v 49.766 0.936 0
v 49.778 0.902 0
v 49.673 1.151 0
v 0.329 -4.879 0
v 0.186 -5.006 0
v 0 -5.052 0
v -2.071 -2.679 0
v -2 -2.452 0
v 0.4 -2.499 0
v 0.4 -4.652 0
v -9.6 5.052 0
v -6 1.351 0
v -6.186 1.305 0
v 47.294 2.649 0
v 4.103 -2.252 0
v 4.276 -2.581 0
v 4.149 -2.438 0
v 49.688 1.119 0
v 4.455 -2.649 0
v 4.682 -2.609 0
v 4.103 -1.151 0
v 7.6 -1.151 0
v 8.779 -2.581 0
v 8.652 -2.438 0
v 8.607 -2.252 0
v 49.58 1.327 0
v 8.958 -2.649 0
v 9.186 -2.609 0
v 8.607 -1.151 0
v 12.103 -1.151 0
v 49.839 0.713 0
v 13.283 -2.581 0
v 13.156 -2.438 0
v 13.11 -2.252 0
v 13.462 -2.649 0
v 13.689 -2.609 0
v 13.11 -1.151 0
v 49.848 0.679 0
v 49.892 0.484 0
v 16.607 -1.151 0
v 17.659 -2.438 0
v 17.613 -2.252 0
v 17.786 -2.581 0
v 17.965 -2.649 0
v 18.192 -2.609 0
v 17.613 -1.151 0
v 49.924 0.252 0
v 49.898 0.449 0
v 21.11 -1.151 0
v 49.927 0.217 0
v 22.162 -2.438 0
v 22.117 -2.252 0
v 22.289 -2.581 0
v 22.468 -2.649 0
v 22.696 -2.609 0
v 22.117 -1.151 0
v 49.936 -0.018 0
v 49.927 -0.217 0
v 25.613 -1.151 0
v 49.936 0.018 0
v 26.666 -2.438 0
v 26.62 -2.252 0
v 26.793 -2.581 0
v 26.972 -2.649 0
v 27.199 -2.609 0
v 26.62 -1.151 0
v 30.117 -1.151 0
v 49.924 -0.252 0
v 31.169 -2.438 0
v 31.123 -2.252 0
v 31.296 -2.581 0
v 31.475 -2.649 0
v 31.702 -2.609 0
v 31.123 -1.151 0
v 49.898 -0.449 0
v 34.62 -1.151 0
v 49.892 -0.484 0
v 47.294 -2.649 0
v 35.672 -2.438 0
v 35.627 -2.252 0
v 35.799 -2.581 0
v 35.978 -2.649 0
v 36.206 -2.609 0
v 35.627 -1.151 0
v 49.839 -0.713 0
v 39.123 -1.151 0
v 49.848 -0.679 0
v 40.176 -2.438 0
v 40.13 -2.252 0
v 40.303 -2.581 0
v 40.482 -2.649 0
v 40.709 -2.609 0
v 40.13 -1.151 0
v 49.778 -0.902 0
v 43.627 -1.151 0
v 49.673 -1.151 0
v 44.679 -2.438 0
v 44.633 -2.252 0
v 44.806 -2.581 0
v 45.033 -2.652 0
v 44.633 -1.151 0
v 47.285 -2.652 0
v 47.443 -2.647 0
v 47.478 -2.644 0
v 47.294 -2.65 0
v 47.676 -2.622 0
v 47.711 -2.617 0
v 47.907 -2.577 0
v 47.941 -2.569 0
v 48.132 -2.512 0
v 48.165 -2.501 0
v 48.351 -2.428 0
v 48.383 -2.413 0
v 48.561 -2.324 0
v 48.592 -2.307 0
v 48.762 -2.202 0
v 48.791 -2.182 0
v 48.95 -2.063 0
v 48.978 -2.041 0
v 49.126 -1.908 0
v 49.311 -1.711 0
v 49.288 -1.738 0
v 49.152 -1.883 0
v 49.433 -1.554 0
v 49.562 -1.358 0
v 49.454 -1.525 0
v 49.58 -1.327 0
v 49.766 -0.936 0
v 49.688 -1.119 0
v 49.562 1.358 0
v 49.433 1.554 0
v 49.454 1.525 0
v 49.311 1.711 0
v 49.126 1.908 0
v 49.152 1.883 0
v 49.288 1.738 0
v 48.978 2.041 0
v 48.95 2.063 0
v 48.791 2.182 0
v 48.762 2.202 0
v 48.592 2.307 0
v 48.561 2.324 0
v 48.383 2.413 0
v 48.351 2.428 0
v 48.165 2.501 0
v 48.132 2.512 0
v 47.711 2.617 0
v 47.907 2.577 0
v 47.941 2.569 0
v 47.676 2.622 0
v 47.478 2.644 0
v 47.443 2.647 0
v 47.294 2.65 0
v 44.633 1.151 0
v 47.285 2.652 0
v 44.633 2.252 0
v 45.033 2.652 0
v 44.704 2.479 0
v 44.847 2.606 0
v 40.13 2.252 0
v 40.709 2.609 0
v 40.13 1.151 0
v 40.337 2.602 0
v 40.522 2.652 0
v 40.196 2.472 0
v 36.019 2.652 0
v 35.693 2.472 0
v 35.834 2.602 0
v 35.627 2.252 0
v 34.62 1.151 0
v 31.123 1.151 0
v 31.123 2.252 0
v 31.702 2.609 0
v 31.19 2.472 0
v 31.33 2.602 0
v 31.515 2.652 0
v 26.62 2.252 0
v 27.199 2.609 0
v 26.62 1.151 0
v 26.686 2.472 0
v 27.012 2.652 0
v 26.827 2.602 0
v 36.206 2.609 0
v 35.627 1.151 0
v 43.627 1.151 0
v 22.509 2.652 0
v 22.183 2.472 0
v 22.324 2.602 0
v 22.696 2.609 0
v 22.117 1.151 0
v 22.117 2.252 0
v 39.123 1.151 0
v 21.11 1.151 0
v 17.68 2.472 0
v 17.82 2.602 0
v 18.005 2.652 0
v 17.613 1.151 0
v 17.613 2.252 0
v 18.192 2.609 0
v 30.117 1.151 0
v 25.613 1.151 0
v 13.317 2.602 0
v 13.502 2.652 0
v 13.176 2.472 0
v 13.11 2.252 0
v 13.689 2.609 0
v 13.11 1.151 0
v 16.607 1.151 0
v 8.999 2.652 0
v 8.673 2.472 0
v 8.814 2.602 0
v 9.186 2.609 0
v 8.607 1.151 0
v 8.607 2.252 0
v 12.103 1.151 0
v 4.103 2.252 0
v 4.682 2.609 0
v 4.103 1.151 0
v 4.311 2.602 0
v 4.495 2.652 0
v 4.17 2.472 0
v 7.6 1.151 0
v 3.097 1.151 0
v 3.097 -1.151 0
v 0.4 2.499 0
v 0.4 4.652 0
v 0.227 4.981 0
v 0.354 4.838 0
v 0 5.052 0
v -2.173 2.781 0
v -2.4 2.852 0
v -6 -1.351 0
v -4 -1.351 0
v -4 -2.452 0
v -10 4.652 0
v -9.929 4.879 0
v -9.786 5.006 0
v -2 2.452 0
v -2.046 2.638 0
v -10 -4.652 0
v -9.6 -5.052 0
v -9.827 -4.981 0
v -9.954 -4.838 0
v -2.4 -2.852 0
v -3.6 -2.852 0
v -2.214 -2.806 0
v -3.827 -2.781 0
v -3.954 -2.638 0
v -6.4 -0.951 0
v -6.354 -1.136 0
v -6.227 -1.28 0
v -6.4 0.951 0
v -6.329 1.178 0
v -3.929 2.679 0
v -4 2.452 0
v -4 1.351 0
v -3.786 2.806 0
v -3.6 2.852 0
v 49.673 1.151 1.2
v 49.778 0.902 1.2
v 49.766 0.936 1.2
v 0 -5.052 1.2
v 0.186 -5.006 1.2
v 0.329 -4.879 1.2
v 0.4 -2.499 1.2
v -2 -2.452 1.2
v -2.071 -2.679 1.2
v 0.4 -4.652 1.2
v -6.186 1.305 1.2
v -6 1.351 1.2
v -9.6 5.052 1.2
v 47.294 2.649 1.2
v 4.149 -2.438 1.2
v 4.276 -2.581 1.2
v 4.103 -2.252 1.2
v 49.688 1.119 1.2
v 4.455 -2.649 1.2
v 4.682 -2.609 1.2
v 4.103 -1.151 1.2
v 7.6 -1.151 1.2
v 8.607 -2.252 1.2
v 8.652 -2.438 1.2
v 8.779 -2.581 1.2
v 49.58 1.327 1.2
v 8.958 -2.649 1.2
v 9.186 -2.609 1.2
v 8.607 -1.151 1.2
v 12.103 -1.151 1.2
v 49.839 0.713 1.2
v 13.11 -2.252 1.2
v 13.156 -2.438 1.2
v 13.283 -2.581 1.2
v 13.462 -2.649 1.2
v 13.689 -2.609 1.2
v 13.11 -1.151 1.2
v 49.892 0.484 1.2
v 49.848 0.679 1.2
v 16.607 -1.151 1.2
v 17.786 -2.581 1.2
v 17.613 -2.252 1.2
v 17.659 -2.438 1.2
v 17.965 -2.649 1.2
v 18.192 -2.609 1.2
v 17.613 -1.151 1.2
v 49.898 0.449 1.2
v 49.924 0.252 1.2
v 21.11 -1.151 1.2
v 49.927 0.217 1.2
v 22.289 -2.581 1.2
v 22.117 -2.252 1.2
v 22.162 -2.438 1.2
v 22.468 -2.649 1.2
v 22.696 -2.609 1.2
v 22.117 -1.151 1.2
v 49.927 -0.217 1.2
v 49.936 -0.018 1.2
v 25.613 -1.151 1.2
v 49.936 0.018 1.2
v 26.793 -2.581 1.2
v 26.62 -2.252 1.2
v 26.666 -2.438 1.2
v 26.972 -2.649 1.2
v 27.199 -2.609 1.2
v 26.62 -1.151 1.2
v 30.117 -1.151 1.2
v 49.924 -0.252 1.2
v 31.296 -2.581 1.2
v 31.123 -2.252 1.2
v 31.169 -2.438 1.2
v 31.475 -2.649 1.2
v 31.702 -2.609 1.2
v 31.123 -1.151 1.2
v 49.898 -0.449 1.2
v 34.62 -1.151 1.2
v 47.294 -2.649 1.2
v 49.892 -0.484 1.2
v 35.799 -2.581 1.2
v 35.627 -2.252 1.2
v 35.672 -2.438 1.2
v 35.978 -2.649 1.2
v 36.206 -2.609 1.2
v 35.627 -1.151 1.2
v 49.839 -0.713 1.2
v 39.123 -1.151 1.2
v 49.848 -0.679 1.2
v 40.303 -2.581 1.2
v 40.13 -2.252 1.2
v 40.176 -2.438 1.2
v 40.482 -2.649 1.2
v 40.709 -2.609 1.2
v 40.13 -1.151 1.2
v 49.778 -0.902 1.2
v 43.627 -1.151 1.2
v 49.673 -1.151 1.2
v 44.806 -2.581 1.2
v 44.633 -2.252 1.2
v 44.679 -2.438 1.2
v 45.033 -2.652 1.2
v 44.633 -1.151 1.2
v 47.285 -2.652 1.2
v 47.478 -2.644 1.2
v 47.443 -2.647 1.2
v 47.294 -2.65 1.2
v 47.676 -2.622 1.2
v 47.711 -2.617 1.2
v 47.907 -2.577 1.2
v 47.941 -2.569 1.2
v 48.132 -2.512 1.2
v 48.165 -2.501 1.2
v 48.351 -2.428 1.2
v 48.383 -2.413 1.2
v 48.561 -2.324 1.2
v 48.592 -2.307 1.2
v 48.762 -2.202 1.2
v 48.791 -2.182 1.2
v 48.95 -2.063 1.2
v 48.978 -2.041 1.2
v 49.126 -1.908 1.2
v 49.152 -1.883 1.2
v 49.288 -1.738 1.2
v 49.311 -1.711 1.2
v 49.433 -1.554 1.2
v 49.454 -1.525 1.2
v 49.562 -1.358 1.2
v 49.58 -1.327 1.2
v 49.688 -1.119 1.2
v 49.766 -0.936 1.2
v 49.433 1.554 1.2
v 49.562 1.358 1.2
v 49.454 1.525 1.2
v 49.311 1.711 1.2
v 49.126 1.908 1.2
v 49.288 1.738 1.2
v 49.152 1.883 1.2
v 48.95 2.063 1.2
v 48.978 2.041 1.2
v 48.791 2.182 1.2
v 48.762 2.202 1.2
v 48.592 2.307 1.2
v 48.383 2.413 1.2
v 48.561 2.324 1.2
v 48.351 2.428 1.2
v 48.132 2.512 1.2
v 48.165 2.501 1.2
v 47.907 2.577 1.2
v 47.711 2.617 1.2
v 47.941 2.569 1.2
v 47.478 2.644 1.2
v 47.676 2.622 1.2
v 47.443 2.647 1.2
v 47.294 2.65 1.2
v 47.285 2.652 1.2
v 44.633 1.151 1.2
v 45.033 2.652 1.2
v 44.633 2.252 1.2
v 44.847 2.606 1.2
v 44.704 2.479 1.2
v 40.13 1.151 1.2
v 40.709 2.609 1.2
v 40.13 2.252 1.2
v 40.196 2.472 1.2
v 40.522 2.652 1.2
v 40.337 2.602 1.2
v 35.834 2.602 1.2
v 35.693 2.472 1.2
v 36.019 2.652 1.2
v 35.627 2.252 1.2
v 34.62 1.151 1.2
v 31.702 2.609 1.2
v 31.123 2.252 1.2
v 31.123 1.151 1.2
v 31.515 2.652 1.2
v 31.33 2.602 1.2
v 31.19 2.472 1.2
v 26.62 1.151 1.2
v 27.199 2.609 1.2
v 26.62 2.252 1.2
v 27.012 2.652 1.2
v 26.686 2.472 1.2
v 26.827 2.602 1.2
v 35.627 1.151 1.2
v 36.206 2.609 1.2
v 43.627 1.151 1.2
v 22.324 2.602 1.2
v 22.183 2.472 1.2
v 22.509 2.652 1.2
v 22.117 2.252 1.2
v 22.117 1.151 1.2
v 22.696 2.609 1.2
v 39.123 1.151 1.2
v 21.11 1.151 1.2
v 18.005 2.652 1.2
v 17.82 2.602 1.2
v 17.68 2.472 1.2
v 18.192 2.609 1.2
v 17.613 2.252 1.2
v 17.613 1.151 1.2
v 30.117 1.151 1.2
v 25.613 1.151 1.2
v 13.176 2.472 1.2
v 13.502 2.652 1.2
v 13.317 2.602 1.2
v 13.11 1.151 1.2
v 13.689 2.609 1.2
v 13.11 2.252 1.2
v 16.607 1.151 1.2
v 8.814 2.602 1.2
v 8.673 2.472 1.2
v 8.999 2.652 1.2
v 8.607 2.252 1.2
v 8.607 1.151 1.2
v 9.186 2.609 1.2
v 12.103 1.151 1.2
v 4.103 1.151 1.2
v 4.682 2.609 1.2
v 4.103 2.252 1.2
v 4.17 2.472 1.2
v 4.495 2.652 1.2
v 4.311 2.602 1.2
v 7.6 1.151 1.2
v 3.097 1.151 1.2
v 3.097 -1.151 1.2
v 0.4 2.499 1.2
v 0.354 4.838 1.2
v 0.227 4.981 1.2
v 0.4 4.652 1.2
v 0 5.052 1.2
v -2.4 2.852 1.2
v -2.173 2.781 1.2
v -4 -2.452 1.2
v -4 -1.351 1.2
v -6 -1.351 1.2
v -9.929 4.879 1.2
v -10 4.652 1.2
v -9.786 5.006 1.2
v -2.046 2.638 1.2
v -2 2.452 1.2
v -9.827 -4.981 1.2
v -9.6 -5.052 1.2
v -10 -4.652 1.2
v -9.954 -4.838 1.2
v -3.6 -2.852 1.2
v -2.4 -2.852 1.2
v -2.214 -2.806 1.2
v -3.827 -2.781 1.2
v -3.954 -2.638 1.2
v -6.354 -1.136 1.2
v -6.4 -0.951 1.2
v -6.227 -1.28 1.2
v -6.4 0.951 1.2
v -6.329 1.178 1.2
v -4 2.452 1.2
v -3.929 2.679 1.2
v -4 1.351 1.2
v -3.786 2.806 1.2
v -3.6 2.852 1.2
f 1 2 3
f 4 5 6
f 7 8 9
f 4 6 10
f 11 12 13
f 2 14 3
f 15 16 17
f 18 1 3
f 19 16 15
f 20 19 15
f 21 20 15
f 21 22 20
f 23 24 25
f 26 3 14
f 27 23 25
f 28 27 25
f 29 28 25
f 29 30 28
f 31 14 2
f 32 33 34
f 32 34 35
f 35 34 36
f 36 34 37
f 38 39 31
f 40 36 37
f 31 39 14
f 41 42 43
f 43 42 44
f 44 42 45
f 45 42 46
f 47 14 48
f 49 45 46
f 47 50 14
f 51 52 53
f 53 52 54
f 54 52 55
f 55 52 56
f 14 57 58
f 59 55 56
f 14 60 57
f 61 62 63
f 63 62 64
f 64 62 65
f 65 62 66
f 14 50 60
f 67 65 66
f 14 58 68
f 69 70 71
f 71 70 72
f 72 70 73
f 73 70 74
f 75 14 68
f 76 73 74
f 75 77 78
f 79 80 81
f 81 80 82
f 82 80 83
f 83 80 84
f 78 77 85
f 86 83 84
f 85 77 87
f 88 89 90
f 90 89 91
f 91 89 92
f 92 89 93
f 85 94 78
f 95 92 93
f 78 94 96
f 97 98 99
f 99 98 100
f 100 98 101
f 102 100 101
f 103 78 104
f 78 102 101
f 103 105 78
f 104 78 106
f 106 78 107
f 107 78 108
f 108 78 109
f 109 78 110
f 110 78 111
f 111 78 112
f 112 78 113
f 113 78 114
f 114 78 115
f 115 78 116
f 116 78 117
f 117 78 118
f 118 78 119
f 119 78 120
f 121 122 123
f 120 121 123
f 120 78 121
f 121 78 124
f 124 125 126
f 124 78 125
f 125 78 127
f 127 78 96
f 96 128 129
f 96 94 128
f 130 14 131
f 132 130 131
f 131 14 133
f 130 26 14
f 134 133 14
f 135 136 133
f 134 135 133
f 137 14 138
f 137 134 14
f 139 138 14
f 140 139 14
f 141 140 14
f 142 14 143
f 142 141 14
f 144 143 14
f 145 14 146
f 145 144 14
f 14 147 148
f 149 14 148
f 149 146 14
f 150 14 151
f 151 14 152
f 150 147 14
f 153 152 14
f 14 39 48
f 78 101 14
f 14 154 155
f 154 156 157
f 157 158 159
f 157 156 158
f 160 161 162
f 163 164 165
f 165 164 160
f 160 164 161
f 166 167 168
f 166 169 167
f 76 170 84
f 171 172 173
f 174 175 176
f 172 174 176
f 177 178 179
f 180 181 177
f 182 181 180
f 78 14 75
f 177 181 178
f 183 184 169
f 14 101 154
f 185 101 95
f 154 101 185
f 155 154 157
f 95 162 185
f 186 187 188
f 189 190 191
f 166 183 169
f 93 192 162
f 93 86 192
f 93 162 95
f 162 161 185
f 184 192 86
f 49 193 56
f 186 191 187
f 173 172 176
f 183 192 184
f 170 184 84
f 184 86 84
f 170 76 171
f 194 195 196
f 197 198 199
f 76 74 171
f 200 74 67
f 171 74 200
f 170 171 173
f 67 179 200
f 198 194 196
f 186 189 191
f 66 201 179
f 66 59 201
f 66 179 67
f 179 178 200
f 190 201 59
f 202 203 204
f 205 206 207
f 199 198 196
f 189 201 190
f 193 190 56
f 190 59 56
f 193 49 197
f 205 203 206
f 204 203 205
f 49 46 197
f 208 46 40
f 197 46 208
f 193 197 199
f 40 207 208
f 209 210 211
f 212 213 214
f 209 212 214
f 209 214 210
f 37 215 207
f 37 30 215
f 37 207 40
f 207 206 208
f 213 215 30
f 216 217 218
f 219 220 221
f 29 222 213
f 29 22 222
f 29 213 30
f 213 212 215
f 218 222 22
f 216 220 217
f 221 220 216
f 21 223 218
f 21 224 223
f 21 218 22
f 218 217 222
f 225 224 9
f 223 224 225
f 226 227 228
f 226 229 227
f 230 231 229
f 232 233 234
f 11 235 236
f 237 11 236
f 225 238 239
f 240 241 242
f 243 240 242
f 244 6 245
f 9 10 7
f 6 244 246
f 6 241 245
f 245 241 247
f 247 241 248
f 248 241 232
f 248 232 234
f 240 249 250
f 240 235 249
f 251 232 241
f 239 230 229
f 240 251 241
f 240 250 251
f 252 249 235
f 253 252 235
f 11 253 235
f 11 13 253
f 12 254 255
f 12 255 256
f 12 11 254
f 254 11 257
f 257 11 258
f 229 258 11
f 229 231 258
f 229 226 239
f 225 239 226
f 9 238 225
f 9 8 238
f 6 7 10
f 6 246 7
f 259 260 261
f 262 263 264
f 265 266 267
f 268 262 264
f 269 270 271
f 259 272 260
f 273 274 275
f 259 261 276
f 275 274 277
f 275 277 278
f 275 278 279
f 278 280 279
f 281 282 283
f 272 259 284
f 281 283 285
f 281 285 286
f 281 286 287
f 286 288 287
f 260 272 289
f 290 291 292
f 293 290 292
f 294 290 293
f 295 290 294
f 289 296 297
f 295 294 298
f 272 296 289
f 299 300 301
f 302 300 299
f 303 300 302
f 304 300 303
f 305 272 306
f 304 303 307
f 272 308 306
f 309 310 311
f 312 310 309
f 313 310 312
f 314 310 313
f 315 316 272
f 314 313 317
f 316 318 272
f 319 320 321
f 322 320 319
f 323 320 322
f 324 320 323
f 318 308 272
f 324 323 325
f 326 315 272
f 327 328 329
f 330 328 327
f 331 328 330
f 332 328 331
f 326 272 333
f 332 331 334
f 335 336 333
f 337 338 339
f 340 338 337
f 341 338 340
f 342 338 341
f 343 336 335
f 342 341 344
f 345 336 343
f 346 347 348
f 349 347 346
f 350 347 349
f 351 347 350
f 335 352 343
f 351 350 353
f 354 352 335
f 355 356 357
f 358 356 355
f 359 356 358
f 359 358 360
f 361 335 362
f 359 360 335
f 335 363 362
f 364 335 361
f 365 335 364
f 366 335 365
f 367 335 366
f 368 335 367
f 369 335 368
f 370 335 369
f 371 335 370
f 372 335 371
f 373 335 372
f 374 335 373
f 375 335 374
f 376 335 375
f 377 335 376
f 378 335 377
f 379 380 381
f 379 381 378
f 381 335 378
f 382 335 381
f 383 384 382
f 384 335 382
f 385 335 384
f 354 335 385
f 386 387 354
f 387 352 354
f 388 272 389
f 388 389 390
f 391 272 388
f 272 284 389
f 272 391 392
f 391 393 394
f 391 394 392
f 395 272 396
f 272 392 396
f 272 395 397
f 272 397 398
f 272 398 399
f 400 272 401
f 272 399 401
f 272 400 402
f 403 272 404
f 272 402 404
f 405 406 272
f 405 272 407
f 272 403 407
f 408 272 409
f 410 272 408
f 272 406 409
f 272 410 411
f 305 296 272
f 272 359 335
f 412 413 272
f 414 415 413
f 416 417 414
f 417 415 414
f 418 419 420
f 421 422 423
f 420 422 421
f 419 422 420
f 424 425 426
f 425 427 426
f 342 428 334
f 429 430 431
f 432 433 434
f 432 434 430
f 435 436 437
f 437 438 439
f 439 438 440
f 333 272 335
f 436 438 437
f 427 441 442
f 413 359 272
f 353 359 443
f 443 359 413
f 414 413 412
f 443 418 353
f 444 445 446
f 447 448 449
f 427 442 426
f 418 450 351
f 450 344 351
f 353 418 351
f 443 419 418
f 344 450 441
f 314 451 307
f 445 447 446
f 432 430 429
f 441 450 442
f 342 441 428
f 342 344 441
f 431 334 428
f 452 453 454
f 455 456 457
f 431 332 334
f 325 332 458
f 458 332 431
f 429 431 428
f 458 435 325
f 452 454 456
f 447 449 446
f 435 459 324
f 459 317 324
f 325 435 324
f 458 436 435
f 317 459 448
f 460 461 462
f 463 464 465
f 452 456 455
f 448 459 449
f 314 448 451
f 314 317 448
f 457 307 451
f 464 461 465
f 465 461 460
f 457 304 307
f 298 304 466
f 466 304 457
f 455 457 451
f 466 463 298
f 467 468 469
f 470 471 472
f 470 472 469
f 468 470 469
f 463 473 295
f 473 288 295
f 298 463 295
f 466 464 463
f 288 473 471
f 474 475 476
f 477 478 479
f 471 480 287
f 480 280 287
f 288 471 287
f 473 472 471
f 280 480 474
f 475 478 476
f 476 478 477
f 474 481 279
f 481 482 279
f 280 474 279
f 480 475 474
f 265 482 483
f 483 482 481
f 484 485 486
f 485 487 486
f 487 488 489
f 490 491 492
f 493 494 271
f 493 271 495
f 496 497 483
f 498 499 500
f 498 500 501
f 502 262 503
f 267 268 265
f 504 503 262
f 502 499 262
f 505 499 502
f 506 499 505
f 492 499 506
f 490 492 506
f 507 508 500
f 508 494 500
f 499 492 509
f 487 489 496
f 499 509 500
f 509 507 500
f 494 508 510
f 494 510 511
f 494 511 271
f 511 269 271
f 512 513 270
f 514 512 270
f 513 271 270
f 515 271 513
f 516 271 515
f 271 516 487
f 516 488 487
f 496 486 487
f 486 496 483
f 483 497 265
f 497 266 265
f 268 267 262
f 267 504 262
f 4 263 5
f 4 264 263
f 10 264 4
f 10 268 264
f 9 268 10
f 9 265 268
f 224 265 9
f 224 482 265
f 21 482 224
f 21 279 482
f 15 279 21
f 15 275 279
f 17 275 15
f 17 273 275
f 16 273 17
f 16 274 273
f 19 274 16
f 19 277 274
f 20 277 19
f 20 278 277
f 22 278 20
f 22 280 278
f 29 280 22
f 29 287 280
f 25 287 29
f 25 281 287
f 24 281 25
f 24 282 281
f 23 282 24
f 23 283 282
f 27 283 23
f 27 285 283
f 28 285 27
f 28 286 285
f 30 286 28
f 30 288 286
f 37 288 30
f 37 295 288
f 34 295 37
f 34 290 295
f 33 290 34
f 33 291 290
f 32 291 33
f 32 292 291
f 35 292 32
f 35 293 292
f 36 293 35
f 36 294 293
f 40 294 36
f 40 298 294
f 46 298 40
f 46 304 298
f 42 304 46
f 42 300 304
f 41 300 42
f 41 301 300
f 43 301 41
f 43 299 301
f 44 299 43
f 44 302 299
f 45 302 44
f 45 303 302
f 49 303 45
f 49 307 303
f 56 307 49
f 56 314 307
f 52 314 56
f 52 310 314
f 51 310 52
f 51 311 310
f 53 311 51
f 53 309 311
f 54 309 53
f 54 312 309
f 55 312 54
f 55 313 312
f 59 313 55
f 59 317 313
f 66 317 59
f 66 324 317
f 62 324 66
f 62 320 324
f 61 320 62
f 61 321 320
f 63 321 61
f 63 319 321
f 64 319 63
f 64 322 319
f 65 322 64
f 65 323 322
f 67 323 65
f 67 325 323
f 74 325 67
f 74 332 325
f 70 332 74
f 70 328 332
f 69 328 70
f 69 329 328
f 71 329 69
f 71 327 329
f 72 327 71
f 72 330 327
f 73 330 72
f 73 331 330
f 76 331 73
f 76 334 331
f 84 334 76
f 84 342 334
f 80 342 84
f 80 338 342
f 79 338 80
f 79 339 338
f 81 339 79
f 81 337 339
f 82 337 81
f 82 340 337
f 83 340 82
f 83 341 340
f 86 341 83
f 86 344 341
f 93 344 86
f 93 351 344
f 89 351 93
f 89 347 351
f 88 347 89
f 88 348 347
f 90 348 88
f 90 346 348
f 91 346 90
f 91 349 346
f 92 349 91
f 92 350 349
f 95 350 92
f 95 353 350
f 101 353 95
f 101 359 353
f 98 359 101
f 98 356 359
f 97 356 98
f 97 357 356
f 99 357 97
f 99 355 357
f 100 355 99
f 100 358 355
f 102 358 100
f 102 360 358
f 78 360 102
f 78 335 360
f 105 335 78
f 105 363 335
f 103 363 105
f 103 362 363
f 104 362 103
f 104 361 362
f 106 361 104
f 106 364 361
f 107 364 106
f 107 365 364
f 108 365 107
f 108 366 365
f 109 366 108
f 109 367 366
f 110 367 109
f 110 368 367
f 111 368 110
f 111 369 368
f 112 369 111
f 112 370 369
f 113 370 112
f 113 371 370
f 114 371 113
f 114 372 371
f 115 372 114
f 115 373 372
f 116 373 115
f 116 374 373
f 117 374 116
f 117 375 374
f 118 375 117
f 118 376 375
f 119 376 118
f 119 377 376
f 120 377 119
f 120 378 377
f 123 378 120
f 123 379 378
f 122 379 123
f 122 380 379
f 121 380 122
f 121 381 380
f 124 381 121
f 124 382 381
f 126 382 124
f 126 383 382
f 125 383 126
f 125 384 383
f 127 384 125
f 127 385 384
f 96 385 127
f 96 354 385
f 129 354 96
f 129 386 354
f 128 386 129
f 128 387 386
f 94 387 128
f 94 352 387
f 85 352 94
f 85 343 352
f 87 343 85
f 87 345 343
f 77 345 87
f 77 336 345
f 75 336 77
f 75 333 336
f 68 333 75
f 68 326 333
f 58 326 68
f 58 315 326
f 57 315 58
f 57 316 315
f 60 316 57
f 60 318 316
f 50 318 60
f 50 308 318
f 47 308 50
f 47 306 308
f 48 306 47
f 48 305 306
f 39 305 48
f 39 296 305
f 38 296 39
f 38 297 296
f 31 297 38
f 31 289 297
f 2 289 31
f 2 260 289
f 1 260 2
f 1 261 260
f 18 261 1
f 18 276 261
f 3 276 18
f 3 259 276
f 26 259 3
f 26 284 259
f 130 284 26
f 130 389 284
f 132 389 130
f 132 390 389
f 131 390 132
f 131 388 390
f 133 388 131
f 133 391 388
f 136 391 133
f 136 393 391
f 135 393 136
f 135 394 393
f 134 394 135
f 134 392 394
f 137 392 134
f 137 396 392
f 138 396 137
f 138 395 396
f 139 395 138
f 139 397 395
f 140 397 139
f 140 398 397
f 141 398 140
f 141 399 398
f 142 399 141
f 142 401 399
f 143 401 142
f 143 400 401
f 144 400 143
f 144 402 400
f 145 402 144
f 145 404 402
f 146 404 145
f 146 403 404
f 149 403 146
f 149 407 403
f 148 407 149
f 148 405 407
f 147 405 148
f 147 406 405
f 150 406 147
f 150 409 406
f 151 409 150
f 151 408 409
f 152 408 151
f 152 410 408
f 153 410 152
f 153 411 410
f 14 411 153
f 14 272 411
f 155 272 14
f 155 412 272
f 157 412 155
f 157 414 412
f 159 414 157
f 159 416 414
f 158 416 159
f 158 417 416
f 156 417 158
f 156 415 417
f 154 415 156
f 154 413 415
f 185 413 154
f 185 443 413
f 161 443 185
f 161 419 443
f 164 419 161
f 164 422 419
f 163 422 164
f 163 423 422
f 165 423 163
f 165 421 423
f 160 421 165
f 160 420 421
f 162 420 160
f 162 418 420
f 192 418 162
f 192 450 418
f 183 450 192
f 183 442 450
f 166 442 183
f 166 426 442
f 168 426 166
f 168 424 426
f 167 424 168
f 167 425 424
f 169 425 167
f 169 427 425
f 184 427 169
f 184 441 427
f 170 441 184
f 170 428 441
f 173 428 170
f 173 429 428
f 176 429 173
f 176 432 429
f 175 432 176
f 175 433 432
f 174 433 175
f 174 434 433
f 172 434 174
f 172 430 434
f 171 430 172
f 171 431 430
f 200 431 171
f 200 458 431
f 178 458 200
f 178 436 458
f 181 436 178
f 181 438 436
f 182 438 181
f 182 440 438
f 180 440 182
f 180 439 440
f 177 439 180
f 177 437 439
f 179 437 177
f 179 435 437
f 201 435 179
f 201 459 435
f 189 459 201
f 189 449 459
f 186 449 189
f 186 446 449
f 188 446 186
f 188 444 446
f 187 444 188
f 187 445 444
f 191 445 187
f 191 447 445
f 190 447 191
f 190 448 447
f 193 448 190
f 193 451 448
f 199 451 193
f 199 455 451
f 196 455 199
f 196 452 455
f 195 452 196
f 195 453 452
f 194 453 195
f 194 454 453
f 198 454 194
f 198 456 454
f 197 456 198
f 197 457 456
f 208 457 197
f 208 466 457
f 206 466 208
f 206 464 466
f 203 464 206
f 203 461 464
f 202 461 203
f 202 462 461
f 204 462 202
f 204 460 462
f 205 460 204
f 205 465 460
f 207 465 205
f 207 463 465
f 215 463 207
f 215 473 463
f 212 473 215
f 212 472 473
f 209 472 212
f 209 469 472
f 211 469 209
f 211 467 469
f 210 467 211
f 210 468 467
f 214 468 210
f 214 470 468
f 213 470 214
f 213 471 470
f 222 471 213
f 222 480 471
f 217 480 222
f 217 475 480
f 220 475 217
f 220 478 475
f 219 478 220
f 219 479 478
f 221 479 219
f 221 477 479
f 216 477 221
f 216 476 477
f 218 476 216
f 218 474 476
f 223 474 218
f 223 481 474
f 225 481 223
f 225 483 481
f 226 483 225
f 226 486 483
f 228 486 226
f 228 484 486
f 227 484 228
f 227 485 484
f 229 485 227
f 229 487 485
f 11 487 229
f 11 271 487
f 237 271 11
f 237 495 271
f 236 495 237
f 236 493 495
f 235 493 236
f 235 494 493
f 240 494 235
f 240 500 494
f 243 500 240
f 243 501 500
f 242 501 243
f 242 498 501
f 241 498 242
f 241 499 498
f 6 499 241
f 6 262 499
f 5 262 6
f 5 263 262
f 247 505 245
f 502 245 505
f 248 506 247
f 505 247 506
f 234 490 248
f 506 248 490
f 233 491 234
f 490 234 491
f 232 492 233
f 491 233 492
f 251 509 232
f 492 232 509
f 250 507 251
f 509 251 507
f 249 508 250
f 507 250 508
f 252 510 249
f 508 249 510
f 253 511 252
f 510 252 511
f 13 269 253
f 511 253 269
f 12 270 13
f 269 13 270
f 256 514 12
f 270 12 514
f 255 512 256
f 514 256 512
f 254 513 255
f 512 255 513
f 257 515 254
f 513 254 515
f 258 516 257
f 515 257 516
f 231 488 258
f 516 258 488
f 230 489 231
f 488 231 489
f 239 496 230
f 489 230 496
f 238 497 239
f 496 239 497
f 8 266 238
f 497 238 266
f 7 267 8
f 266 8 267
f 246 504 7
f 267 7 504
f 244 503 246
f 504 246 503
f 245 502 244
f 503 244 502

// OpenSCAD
/*
 * cabletie.scad generates cable ties meant to be 3D printed in TPU
 */

// Variables default values
cabletie_width = 6;
cabletie_wrapping_diameter = 15;
cabletie_minimum_thickness = 1.2; // would be override if to large

// FDM 3D printer parameters
nozzle_width = 0.4;
printer_tolerance = 0.2;

// funcions
function cabletie_wrapping_circumference(d=cabletie_wrapping_diameter) = 3.14*d;
function cabletie_steps_lenth(w=cabletie_width, nw=nozzle_width) = (w-2*nw)*cos(30);
function cabletie_links_count(d=cabletie_wrapping_diameter, w=cabletie_width, nw=nozzle_width) = floor(cabletie_wrapping_circumference(d)/cabletie_steps_lenth(w, nw));
function retainer_hole_length(w=cabletie_width, nw=nozzle_width) = cabletie_steps_lenth(w, nw)/3;
function release_hole_length(w=cabletie_width, nw=nozzle_width) = cabletie_steps_lenth(w, nw);
function cabletie_maximum_thickness(w=cabletie_wrapping_diameter, nw=nozzle_width) = (cabletie_steps_lenth(w, nw)/3+nw)/tan(30)-(nw/sin(30)-nw);
function cabletie_thickness(mini_thickness, maxi_thickness) = mini_thickness > maxi_thickness ? maxi_thickness : mini_thickness;

// Resolution
$fa=2; // default minimum facet angle
$fs=0.2; // default minimum facet size

module cabletie(w=cabletie_width,
                d=cabletie_wrapping_diameter,
                t=cabletie_minimum_thickness,
                nw=nozzle_width,
                pt=printer_tolerance) {
     translate([0, 0, cabletie_thickness(t, cabletie_maximum_thickness(w, nw))/2])
     linear_extrude(height = cabletie_thickness(t, cabletie_maximum_thickness(w, nw)),
                    center = true, convexity = 10, twist = 0) {
          difference() {
               //offset(r = 0) {
               offset(r = nozzle_width) { // smooth hard edges
                    union() {
                         // links
                         for (i = [0 : cabletie_steps_lenth(w, nw) : cabletie_steps_lenth(w, nw)*(cabletie_links_count(d, w, nw)-1)]) {
                    	         translate([i, 0, 0]) {
                                 
                                   polygon(points=[// shape of a regular link
                                                   [0,0],
                                                   [0,cabletie_steps_lenth(w, nw)/2],
                                                   [cabletie_steps_lenth(w, nw),0],
                                                   [0,-cabletie_steps_lenth(w, nw)/2]
                                                  ]);
                             }
                    	   }
                         // last link custom shape
                         translate([cabletie_steps_lenth(w, nw)*(cabletie_links_count(d, w, nw)+0.5), 0, 0]) {
                              circle(d = cabletie_steps_lenth(w, nw));
                         }
                         translate([cabletie_steps_lenth(w, nw)*(cabletie_links_count(d, w, nw)), -cabletie_steps_lenth(w, nw)/2, 0]) {
                              square([cabletie_steps_lenth(w, nw)/2, cabletie_steps_lenth(w, nw)]);
                         }
                         // connect all links
                         translate([0, -(cabletie_steps_lenth(w, nw)/3)/2, 0]) {
                              square([cabletie_steps_lenth(w, nw)*(cabletie_links_count(d, w, nw)), cabletie_steps_lenth(w, nw)/3]);
                         }
                         // locker
                         translate([-8*cabletie_thickness(t, cabletie_maximum_thickness(w, nw)),
                                    -(release_hole_length(w, nw)+4*cabletie_thickness(t, cabletie_maximum_thickness(w, nw)))/2,
                                    0])
                         square([8*cabletie_thickness(t, cabletie_maximum_thickness(w, nw)),
                                 release_hole_length(w, nw)+4*cabletie_thickness(t, cabletie_maximum_thickness(w, nw))]);
                    }
               }
               offset(r = nozzle_width) { // smooth hard edges
                    union() {
                         // release hole
                         translate([-3*cabletie_thickness(t, cabletie_maximum_thickness(w, nw)),
                                    -release_hole_length(w, nw)/2-printer_tolerance,
                                    0])
                         square([cabletie_thickness(t, cabletie_maximum_thickness(w, nw)),
                                 release_hole_length(w, nw)+2*printer_tolerance]);
                         // retainer hole
                         translate([-5*cabletie_thickness(t, cabletie_maximum_thickness(w, nw)),
                                    -retainer_hole_length(w, nw)/2-printer_tolerance,
                                    0])
                         square([2*cabletie_thickness(t, cabletie_maximum_thickness(w, nw)),
                                      retainer_hole_length(w, nw)+2*printer_tolerance]);
                    }
               }
          }
     }
}

// Demo
//cabletie(6, 15, 1.0);
//translate([0, -12, 0]) cabletie(6, 20, 1.0);
//translate([0, -24, 0]) cabletie(6, 25, 1.0);
//
//translate([0, -40, 0]) cabletie(8, 20, 1.2);
//translate([0, -55, 0]) cabletie(8, 25, 1.2);
//translate([0, -70, 0]) cabletie(8, 30, 1.2);
//
//translate([0, -90, 0]) cabletie(10, 35, 1.4);
//translate([0, -108, 0]) cabletie(10, 45, 1.4);
//translate([0, -126, 0]) cabletie(10, 55, 1.4);

// Customizer
cabletie();
